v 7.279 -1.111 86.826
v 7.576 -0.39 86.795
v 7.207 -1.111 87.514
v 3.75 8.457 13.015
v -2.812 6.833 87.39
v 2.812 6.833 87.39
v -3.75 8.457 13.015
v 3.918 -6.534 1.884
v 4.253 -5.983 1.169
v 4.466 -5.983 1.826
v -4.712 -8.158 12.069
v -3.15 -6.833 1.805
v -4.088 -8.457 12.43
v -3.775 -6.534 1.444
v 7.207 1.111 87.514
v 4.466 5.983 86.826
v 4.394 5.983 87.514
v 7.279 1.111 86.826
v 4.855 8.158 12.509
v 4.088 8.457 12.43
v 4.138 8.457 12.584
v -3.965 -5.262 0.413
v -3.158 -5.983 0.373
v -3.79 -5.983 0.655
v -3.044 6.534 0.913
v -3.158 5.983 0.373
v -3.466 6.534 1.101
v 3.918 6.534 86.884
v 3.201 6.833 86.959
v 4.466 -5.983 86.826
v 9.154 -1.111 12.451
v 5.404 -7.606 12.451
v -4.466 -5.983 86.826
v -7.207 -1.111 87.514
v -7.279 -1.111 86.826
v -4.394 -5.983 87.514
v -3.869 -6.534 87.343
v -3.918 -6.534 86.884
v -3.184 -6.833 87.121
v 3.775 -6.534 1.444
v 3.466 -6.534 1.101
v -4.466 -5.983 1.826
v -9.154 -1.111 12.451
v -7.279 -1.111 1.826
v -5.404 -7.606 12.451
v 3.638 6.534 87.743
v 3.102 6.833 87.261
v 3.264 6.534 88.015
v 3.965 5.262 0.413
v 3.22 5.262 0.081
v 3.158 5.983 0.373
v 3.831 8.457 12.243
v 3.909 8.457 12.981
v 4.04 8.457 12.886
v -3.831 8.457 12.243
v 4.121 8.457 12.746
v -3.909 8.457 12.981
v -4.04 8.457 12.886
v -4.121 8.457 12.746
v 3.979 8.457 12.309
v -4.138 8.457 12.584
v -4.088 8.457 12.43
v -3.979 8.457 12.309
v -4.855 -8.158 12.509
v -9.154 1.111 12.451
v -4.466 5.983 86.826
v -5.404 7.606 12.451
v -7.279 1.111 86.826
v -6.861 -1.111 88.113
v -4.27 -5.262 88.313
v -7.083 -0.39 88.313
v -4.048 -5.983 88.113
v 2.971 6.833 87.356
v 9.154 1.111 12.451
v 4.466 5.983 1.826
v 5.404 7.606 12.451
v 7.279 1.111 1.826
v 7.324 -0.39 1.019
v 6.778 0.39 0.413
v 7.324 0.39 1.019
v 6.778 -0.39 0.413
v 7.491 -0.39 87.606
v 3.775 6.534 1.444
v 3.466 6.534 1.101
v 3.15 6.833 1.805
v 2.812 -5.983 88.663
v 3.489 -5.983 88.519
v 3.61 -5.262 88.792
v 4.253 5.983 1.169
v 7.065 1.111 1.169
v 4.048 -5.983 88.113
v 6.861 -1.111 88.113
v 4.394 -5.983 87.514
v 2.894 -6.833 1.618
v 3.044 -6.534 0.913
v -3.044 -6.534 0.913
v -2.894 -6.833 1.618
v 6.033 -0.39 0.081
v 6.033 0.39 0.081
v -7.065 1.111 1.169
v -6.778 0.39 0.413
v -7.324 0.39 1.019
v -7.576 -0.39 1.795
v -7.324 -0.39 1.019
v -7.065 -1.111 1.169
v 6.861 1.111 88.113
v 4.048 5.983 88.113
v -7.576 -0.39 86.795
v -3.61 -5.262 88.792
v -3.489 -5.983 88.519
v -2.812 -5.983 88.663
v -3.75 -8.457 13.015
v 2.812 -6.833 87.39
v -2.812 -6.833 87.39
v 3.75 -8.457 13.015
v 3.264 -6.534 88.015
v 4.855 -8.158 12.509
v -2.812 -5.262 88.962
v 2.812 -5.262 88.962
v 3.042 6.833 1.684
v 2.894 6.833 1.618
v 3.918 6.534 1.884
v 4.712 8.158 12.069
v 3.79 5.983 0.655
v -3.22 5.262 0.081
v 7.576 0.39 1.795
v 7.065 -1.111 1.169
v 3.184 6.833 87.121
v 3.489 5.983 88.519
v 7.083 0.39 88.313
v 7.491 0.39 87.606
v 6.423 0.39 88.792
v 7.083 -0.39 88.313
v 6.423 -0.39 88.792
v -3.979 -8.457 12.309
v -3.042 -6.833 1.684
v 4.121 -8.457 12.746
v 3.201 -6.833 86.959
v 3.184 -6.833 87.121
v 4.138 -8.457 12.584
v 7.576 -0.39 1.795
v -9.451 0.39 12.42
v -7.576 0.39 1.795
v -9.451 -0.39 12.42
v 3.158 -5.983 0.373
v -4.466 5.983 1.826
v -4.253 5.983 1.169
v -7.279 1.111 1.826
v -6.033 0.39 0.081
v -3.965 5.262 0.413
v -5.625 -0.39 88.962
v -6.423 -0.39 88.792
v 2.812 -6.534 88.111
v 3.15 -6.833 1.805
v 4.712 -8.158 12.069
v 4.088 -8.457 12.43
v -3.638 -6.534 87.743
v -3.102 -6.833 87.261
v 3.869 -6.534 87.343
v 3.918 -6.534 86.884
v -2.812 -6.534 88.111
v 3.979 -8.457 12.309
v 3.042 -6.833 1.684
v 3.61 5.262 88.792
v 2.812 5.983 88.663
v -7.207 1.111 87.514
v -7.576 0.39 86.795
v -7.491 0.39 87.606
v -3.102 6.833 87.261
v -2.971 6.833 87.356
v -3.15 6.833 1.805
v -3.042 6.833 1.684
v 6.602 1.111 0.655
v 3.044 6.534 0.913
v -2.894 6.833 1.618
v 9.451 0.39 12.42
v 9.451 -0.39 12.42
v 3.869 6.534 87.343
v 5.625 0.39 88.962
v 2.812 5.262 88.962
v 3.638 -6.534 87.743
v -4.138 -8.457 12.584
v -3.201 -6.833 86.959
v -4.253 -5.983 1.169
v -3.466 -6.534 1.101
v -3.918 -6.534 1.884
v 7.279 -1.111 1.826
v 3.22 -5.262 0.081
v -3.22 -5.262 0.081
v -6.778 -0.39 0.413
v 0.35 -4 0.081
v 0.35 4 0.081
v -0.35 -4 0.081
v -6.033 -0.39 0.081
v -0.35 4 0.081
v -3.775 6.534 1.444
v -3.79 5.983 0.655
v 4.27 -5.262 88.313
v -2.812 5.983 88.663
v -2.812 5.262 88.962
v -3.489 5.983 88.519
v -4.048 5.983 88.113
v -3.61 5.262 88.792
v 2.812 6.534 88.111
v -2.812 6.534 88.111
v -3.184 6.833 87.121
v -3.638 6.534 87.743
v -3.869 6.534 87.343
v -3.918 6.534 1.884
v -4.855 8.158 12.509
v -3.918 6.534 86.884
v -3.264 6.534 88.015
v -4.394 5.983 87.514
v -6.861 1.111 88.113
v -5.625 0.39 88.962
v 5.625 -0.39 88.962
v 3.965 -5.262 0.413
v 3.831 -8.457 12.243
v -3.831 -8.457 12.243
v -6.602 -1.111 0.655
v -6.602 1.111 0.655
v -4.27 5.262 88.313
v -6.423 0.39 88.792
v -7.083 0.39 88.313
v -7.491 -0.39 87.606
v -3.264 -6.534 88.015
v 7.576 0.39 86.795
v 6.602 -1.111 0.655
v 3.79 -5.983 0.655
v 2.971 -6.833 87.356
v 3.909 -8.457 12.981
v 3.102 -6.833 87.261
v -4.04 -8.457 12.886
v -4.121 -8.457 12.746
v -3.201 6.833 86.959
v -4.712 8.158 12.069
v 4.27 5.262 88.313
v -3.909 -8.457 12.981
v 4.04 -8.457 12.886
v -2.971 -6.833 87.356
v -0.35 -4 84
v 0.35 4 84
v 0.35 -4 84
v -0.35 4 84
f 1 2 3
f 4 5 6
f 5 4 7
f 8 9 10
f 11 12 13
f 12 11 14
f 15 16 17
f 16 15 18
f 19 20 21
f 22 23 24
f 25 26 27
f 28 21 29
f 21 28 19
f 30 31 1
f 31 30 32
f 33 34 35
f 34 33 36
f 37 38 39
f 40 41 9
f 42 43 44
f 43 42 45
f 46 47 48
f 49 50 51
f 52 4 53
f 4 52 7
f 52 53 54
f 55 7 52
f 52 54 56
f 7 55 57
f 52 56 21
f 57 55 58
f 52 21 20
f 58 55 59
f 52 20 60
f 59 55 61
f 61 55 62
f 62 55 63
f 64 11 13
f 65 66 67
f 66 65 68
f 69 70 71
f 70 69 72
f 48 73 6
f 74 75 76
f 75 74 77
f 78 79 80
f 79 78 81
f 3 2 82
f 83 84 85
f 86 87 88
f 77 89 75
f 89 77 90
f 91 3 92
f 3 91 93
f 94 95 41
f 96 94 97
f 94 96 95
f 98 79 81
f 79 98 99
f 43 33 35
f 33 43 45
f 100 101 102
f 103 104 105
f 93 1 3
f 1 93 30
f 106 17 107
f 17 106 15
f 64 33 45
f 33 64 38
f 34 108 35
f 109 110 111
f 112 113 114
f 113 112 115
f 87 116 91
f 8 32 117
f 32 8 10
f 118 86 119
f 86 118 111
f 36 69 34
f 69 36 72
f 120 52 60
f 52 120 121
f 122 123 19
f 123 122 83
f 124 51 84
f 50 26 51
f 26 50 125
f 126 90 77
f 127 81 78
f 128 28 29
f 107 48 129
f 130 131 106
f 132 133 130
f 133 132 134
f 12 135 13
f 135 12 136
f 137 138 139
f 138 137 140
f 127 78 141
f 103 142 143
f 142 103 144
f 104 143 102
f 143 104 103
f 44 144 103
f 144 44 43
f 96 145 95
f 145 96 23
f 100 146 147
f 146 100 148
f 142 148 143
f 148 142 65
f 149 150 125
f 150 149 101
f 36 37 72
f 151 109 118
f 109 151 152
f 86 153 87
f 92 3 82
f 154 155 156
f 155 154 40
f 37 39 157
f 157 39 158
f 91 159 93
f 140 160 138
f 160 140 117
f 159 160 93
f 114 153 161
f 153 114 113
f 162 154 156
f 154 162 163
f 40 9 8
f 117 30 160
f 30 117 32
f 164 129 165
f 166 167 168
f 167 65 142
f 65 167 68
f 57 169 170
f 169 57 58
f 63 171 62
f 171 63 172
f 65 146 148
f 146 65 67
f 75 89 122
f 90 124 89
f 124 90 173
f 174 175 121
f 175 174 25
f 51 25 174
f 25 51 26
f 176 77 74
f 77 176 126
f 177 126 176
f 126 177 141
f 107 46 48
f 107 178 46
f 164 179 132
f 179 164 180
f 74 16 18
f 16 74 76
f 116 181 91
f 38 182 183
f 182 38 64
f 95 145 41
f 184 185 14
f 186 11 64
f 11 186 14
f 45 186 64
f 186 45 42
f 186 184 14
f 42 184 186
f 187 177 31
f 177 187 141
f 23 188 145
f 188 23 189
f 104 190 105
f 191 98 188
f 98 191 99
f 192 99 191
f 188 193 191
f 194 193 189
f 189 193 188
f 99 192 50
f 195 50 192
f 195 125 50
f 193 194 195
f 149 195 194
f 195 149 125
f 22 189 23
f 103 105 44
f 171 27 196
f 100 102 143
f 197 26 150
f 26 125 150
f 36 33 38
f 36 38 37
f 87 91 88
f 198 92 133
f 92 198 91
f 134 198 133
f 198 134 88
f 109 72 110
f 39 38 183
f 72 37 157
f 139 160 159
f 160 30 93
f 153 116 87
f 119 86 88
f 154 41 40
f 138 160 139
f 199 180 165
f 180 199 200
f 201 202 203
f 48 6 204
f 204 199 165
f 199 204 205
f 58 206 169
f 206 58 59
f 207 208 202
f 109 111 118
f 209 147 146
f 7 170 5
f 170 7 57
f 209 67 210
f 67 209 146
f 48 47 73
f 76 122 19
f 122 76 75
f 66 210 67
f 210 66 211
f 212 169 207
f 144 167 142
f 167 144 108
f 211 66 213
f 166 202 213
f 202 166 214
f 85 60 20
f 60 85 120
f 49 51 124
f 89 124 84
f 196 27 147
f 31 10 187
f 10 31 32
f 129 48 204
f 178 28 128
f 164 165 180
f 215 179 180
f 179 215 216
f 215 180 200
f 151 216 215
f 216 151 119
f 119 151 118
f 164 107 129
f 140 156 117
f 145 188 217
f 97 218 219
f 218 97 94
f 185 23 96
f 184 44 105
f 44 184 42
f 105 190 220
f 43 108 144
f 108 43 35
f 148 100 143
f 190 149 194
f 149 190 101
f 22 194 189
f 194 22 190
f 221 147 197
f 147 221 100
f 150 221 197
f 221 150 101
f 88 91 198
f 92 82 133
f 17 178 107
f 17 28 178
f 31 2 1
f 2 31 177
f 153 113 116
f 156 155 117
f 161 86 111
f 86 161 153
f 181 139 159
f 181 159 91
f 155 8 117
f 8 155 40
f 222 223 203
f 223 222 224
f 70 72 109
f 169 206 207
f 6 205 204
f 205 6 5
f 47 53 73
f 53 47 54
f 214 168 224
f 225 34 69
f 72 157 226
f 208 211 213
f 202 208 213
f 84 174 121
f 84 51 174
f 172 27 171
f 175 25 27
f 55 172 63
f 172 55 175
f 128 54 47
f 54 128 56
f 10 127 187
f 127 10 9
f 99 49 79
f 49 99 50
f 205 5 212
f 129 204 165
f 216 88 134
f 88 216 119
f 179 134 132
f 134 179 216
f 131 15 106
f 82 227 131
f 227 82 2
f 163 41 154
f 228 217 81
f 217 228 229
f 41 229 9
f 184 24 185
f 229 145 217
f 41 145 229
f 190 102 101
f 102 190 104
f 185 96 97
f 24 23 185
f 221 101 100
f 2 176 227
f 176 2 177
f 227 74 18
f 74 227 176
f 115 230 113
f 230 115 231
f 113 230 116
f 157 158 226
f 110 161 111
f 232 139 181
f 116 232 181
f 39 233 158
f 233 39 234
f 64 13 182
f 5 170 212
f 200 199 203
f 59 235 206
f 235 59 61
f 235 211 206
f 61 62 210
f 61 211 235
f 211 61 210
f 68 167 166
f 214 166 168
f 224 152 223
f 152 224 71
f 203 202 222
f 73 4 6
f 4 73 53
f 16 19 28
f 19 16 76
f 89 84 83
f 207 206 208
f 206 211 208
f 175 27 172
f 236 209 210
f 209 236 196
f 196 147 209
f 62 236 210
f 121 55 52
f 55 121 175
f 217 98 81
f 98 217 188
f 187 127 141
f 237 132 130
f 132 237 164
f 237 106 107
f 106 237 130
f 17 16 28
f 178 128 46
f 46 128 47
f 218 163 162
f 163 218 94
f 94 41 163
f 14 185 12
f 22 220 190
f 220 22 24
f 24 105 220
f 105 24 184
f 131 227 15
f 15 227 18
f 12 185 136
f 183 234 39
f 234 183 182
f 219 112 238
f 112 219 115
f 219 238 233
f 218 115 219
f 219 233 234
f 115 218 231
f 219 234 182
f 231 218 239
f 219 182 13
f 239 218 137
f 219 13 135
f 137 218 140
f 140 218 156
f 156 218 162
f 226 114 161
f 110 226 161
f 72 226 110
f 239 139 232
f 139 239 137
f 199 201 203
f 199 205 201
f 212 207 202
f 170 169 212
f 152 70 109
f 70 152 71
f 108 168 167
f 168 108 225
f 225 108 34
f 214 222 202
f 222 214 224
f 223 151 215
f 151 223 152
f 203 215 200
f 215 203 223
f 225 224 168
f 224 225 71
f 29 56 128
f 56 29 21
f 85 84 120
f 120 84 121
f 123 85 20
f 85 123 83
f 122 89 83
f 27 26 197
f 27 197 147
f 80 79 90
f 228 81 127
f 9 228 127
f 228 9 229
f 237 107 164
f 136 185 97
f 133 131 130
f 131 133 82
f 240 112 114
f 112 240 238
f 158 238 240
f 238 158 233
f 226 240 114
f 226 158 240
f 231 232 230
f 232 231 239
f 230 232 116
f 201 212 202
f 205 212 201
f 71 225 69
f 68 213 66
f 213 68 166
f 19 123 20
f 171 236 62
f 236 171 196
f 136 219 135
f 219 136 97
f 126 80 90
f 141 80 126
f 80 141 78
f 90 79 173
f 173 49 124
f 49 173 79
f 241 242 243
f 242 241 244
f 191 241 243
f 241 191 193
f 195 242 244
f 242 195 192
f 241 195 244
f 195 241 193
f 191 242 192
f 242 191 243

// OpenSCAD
/* [Pick Dimensions in mm] */
// Length
pickLength=82;
// Width
pickWidth=8;
// Depth
pickDepth=.7;
// Rotation
pickRotation = 10;

/* [Handle Dimensions in mm] */
// Length
length=85;
// Width
width=15;
// Depth
depth=4.5;
// Top scale. 0-100. The percent  of handle width at the pick end of the tool.
topScalePercent=75;
// The middle focal percent. 0-100. The pick is generated with the midle point at 100% of pick width, but where this takes place is controllable. 
middleFocalPercent=12.5;
// Bottom scale. 0-100. The percent of handle width at the butt.
bottomScalePercent=75;
// Number of sides. 3 is triangular, 4 square, and so on. Try 200 for "smooth". Make sure your handle contains the picks!
sides=6;

// Smoothing.
minkowski=true;
// Smoothing radius. This is additive to the outside dimensions of your pick, you can subtract off of your handle to compensate, but your base pick cannot be less than zero an any dimension.
minkowskiSize=2;
// Smoothing "roundness". 4-15 suggested, more is probably overkill...
minkowskiRoundness=15;

/* [Hidden] */
topScale=topScalePercent * .01;
middleFocal=length * (middleFocalPercent * .01);
bottomScale=bottomScalePercent * .01;

module rawPick() {
  rotate_extrude($fn=sides) {
    rotate([180, 0, 90]){ 
      polygon(points=[
        [0,0],
        [0, width/2*topScale],
        [middleFocal, width/2],
        [length, width/2 * bottomScale],
        [length, 0]
      ]);
    }
  }  
}

module softPick() {
  translate([minkowskiSize, 0,0]) {
    difference() {
      $fn=minkowskiRoundness;
      minkowski(){      
        rotate([90, 0, 90]){
          rawPick();
        }
        sphere(r=minkowskiSize);
      }
      
      translate([-minkowskiSize,-pickDepth/2,-pickWidth/2]) {
        cube([pickLength + minkowskiSize, pickDepth, pickWidth], false);
      }
    }
  }
}

module hardPick() {
  difference() {
    rotate([90, 0, 90]){
      rawPick();
    }
   
    translate([-minkowskiSize,-pickDepth/2,-pickWidth/2]) {
      cube([pickLength + minkowskiSize, pickDepth, pickWidth], false);
    }
  }
}

rotate([90,270,0]) {
  if(minkowski==true){
    softPick();
  } else {
    hardPick();
  }
}
